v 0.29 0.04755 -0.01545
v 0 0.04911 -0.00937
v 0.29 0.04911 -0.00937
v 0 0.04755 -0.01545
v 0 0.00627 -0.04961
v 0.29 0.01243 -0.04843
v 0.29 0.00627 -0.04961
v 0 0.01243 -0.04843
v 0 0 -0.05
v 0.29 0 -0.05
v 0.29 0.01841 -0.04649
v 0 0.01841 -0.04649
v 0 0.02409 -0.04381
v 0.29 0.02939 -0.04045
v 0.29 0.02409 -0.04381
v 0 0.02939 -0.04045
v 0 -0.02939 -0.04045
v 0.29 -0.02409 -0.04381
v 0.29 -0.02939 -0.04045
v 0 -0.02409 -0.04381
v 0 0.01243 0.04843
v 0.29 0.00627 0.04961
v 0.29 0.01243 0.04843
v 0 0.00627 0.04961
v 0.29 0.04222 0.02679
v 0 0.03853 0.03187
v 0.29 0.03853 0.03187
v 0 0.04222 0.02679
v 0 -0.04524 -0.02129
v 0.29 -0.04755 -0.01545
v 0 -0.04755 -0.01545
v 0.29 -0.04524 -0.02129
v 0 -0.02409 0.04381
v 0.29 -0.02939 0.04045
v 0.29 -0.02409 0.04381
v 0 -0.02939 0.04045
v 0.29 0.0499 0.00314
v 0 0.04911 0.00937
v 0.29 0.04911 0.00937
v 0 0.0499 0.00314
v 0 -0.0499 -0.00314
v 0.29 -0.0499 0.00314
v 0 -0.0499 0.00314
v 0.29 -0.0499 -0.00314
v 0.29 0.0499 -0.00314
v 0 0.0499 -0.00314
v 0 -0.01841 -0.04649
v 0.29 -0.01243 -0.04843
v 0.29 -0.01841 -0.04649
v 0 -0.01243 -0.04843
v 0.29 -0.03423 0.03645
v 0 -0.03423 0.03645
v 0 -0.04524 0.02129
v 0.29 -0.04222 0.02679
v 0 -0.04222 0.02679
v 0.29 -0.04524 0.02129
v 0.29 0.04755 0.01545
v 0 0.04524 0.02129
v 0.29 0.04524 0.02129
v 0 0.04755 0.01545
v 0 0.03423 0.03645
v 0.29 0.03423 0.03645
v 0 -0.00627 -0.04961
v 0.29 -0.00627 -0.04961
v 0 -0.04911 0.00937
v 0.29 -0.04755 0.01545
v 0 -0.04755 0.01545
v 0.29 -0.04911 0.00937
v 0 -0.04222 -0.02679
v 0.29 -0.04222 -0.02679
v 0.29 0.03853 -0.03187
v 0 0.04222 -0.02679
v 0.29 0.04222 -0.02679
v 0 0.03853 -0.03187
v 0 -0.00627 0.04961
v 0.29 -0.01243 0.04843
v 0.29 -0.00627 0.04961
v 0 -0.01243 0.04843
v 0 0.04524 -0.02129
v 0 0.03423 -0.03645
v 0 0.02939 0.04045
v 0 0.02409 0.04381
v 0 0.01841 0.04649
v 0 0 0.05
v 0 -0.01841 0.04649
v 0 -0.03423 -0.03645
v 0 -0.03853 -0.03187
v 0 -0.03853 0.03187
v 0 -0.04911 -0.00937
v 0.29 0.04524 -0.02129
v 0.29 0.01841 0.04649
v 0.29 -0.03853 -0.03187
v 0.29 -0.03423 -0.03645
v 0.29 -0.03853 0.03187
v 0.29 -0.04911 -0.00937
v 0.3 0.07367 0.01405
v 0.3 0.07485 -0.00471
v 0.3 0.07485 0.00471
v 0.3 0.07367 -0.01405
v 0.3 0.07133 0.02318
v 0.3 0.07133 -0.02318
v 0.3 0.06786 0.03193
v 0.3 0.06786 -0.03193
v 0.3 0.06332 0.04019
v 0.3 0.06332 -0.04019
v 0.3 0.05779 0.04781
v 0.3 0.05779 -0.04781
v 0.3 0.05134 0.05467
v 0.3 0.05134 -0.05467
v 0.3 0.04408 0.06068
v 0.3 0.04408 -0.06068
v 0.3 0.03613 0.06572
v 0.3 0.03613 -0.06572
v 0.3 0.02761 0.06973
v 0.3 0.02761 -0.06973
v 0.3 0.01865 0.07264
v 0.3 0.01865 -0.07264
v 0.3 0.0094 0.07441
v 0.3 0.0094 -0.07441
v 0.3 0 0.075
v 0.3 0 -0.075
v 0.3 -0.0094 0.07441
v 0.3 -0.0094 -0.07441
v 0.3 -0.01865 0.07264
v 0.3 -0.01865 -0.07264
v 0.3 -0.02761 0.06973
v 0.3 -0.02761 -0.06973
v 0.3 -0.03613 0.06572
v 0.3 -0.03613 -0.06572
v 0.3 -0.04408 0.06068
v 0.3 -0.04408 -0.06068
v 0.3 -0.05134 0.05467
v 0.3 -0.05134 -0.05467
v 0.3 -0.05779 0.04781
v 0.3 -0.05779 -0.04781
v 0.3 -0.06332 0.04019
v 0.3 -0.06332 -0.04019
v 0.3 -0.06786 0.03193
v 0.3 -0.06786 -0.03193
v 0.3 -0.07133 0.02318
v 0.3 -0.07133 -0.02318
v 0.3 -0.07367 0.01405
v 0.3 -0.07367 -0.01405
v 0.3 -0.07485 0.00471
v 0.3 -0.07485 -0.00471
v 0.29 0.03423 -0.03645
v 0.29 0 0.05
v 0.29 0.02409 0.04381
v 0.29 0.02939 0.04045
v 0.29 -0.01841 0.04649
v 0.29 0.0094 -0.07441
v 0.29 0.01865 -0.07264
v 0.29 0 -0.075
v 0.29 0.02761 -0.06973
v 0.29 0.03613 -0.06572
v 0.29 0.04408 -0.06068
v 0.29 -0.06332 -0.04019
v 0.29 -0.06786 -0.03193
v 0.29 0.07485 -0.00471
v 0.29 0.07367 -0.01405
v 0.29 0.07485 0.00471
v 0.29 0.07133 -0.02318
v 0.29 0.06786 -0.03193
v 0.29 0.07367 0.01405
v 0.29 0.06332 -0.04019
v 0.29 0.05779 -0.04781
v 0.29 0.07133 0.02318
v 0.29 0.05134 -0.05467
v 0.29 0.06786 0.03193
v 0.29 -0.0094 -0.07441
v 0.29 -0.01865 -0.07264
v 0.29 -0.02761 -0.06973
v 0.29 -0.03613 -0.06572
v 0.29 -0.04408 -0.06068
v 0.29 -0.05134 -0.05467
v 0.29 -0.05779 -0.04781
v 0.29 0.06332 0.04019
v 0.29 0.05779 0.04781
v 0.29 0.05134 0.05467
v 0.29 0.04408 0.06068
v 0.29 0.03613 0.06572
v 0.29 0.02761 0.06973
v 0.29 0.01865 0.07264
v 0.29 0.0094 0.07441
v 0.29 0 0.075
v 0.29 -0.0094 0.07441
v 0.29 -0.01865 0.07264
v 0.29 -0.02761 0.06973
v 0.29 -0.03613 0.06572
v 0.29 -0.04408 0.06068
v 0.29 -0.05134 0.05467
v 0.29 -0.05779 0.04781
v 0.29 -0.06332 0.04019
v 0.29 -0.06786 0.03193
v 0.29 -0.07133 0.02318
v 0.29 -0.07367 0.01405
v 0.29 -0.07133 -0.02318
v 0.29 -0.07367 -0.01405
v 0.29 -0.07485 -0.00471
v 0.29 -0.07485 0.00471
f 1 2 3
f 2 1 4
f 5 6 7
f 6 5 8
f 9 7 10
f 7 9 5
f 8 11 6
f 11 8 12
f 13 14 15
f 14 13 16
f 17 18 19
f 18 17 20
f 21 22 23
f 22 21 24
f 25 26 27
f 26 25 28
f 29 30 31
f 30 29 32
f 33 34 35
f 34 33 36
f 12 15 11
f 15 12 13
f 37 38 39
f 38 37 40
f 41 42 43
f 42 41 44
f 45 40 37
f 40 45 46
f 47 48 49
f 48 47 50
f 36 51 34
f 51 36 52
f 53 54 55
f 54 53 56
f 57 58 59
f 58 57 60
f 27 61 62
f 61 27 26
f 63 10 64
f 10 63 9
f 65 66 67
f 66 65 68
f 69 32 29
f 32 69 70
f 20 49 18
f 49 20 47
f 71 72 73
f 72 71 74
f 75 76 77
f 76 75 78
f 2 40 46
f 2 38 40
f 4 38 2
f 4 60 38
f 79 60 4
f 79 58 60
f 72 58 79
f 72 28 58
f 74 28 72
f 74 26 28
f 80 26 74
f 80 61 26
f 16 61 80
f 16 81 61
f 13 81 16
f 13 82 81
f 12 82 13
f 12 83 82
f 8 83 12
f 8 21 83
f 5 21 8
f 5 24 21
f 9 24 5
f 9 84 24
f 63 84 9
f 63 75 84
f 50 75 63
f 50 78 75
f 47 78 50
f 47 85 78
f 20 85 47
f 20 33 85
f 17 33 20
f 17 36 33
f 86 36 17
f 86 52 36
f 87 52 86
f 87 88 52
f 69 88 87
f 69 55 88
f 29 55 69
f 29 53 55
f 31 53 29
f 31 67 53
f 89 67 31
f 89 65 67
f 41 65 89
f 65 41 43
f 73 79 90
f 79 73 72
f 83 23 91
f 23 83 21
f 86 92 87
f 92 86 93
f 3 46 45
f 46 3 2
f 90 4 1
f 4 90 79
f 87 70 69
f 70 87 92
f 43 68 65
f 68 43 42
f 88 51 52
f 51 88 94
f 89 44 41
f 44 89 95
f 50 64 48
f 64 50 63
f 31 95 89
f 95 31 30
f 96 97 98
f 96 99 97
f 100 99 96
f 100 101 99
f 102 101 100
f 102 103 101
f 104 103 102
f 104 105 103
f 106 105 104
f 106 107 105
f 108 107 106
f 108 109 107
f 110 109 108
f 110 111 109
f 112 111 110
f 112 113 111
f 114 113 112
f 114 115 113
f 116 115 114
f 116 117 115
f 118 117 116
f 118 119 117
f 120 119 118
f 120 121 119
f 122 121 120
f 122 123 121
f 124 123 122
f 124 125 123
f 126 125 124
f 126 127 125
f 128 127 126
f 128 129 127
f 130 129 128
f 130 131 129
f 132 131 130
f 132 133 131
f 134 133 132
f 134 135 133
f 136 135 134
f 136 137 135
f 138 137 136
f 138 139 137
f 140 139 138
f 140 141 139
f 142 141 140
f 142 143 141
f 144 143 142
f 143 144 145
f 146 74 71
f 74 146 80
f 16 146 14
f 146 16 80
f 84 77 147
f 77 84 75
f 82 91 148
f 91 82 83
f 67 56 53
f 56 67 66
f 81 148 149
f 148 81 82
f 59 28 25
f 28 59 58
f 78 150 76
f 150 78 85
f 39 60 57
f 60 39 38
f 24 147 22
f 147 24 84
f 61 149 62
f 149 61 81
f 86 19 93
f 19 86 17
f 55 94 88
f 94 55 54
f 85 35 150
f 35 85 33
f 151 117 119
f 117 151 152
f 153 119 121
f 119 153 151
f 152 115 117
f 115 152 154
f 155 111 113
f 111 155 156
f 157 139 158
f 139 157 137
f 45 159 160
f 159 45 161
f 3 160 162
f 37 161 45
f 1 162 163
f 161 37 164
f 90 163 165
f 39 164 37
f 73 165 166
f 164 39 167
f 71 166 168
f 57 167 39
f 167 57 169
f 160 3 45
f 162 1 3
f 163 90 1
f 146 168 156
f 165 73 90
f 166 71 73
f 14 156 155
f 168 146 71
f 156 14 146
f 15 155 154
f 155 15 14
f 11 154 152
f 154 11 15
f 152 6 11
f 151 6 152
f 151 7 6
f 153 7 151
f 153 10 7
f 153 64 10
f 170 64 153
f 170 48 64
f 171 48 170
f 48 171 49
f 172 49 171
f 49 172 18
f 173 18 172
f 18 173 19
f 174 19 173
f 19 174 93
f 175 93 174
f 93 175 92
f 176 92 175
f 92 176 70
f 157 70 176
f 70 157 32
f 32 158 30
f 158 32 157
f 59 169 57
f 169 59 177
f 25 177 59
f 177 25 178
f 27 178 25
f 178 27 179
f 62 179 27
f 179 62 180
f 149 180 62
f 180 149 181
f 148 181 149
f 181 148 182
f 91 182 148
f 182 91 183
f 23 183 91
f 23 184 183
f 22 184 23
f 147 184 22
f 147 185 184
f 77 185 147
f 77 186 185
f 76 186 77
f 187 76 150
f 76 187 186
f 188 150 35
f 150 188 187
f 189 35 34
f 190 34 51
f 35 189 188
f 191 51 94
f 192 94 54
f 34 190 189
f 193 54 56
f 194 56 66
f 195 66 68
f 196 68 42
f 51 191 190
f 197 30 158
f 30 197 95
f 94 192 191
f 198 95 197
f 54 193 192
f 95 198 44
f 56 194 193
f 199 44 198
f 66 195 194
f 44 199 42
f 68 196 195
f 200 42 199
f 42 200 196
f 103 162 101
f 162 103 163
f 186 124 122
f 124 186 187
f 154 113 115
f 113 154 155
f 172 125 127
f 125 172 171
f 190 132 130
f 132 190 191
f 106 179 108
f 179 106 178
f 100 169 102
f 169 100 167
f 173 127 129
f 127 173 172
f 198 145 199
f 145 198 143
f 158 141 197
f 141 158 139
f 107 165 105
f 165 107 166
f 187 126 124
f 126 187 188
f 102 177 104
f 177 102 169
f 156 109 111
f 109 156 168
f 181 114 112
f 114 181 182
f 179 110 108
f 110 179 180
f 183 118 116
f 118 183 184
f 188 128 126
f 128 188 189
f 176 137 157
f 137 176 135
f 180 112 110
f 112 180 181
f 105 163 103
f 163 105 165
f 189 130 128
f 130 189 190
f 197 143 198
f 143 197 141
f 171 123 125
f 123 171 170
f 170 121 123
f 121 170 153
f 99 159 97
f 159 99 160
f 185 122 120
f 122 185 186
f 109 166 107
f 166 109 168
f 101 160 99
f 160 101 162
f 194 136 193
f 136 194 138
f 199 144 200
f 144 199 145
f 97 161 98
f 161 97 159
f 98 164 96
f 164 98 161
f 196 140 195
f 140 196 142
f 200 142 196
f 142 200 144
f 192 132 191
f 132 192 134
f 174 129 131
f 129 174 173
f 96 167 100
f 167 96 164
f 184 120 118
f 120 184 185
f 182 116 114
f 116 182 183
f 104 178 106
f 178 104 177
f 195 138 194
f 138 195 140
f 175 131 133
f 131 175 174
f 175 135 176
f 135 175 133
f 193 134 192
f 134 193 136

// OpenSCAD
$fn=50;  // REMOVE
LENGTH = 0.3;  // REMOVE
DO = 0.1; // REMOVE
rotate([0,90,0]) { cylinder(h=(LENGTH), r=(DO)/2); translate([0,0,(LENGTH)-(DO)*0.1]) cylinder(h=(DO)*0.1, r=(DO)*1.5/2); }
